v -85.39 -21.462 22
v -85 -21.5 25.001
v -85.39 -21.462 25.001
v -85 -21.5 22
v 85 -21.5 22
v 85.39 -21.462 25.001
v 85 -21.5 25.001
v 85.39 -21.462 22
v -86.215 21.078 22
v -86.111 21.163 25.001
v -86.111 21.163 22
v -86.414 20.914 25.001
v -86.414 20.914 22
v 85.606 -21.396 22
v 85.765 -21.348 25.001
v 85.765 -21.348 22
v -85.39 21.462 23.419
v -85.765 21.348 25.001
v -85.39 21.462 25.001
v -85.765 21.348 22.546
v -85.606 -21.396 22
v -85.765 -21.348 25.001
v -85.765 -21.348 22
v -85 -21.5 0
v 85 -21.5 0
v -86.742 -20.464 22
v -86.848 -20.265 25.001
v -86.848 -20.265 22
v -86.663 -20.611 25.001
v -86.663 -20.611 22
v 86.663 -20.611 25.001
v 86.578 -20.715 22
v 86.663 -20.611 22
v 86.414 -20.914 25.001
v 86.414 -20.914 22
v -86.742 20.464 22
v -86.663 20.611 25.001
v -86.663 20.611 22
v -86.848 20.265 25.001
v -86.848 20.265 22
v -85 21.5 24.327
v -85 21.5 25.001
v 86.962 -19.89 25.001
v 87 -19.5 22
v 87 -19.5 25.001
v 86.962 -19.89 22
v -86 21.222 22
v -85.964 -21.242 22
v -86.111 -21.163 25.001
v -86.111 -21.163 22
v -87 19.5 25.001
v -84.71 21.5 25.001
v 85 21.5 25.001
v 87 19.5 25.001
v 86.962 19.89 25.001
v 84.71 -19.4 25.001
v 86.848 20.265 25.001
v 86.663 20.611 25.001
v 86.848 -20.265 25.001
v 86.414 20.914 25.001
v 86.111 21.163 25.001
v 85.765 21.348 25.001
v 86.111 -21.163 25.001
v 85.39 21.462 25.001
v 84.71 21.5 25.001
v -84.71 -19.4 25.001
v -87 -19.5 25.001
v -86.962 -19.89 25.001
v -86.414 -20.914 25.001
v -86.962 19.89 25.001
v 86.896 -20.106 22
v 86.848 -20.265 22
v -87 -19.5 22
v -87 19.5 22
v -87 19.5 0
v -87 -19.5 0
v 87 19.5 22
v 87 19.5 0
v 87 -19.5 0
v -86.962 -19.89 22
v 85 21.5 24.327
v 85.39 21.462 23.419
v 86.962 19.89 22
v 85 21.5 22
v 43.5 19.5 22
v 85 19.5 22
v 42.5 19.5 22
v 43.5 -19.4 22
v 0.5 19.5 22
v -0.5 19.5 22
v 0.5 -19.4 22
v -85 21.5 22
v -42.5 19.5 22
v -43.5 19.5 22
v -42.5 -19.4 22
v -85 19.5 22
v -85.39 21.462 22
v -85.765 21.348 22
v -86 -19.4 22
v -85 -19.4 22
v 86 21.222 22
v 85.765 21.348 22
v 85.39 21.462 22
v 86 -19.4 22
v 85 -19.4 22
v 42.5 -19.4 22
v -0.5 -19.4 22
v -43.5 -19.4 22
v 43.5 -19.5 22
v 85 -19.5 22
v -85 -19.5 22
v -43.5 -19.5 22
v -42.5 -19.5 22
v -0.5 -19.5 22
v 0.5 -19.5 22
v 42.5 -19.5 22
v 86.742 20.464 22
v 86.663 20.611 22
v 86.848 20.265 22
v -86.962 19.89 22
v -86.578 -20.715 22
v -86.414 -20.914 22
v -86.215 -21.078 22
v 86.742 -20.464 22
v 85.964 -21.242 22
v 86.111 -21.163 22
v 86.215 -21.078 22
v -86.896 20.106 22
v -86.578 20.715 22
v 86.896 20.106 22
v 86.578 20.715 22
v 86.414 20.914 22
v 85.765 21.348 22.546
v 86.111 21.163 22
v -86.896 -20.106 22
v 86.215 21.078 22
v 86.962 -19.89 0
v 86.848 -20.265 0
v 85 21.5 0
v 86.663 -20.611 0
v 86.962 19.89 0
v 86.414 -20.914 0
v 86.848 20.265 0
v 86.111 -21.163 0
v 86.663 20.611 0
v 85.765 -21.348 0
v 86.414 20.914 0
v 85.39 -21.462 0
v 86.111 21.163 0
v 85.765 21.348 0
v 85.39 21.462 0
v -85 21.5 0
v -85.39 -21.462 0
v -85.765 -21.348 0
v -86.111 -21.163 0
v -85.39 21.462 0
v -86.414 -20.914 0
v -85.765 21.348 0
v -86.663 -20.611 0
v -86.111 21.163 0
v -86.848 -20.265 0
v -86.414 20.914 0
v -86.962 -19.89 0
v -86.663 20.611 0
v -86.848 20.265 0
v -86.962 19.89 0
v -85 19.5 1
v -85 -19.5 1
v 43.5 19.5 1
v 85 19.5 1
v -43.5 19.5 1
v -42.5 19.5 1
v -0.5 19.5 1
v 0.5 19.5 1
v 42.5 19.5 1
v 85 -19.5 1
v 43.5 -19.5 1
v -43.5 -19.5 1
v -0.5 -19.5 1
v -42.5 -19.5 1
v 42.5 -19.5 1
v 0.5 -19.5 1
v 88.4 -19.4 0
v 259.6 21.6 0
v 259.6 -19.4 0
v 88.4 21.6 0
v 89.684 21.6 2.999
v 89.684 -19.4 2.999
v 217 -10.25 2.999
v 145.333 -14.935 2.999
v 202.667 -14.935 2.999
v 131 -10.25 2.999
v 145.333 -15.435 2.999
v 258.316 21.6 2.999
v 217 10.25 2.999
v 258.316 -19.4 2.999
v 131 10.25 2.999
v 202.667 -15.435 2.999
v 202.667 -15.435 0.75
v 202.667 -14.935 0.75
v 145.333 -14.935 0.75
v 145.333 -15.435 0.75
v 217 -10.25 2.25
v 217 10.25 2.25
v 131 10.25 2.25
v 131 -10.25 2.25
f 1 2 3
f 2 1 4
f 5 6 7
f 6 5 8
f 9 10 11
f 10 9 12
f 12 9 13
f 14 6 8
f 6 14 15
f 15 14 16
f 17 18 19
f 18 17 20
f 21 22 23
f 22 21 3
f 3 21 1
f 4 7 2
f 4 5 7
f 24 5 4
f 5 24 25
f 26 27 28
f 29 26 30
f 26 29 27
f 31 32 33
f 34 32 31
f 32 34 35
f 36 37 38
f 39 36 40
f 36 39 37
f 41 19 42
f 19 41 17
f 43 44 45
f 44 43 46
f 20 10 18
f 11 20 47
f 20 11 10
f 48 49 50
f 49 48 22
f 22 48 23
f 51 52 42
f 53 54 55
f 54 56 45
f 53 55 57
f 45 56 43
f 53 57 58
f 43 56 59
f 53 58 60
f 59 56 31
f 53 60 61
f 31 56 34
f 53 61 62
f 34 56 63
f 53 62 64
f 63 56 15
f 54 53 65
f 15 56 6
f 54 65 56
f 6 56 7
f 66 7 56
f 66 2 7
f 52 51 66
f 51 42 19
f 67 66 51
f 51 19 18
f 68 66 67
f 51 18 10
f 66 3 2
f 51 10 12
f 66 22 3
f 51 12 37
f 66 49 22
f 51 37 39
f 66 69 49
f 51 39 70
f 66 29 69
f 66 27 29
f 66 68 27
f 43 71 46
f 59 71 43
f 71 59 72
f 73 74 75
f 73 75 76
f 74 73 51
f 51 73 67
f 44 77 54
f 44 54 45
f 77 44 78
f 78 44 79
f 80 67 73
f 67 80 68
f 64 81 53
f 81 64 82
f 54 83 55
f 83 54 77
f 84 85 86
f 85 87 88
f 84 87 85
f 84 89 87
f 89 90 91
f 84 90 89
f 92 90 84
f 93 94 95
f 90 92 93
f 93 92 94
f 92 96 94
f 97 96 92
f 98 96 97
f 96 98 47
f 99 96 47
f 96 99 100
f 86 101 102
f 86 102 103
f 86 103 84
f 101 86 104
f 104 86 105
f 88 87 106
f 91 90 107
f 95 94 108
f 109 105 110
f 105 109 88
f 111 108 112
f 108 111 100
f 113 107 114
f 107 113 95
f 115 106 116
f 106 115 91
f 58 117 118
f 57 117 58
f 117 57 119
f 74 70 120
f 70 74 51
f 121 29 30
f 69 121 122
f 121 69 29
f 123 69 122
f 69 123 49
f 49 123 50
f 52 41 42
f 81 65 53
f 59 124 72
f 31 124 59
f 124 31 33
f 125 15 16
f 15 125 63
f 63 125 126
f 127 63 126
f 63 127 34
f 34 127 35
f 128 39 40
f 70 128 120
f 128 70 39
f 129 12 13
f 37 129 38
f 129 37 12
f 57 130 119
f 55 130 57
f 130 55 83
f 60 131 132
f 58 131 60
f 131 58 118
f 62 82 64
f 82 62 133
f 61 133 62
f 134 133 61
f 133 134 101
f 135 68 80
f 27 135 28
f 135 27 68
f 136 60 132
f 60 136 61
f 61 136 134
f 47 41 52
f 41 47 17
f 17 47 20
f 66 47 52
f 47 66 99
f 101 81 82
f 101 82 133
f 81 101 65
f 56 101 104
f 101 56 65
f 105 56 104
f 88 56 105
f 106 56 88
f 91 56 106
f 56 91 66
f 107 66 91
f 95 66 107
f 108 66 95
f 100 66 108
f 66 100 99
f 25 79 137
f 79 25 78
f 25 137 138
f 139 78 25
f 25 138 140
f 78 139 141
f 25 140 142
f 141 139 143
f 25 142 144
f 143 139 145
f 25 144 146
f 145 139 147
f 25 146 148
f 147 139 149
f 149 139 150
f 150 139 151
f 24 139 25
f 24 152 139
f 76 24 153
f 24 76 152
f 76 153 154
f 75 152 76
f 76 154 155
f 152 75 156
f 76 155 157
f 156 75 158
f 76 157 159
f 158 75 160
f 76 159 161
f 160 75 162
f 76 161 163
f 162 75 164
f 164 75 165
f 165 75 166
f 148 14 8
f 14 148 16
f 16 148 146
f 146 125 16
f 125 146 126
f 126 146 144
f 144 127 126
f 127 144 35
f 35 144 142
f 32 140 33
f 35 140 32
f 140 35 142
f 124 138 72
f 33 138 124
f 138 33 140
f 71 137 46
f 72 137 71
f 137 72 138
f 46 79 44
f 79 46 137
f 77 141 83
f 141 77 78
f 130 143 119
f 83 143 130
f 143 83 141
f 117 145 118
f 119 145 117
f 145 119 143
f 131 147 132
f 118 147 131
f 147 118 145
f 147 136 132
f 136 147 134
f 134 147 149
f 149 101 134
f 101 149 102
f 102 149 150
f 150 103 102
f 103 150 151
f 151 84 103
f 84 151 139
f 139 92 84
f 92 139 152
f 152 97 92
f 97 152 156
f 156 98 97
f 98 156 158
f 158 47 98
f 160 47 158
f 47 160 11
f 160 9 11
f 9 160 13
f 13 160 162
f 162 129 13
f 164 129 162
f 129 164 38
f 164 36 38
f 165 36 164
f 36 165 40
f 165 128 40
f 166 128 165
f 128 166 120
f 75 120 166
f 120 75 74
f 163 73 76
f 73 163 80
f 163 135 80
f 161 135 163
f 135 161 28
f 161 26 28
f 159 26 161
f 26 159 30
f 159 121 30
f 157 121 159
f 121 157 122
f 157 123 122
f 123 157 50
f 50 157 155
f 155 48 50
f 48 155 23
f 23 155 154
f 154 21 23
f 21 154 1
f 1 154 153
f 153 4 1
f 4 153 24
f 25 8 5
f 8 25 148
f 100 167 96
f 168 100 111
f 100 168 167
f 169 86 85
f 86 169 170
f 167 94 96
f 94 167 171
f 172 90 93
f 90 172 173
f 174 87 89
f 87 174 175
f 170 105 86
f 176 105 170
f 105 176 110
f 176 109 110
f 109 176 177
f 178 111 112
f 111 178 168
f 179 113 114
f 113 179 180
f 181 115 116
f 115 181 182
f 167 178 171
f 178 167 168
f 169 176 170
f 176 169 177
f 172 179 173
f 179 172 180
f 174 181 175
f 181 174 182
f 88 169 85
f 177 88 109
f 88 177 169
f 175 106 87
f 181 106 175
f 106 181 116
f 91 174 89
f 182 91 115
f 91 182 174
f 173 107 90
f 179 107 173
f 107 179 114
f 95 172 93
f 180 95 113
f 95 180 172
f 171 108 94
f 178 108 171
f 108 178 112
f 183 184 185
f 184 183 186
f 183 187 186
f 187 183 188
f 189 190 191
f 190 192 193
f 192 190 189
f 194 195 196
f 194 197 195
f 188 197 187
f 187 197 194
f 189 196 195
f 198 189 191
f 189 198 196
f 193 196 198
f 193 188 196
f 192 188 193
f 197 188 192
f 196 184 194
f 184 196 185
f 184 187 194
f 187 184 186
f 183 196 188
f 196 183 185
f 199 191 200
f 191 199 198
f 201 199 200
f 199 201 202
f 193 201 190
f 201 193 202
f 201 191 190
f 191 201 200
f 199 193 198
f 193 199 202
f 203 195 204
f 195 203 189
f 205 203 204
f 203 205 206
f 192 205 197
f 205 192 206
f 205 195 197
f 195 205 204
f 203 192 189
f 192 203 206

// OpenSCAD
// Box builder with angled sliding lid.
// Has potential recess for label and fingernail grip to open.


// preview[view:north west, tilt:top diagonal]

// Width of Box
Box_x = 172;
// Length of Box
Box_y = 41;
// Height of Box
Box_z = 25; 
Wall_thickness = 2;  //[2:0.5:10]
Floor_thickness = 1;
Lid_thickness = 3;   //[2:0.5:10]
// Add inset for a Label
Lid_inset = "yes"; // [yes,no]
// Fingernail recess to ease opening lid
Grip_recess = "yes"; // [yes,no]

// Amount of play in the lid to fit well.
Looseness = 0.8;  //[0:0.1:1]
//
Show_assembled = "no"; // [yes,no]
// Number of internal dividers
X_Dividers = 3;
// Number of internal dividers
Y_Dividers = 0;

/* [Hidden] */
//Lid scale (effective overhang)
lid_scale = 0.985;
fingernail_width = 0.5;

Delta = 0.1;     // to get good overlaps for real objects
roundness = 32;  // for curve res.
epsilon = 0.001; // for minkowski lid height :(

// Lid
module lid(extra_x=Looseness, extra_z=Delta*2) {
	translate([0,Wall_thickness/2+Delta,-Lid_thickness/2-epsilon/2])
	linear_extrude(height=Lid_thickness+extra_z*2, scale=[lid_scale,1])
		square(size=[Box_x+extra_x,Box_y], center=true);
}

// undercut ridge on top of box to hold lid
module lid_ridge(x,y) {
	difference() {
		// the surround
		minkowski(){
			cube(size=[x,y,Lid_thickness], center=true);
			cylinder(h=epsilon, r=Wall_thickness, $fn=roundness); // increases lid height by 2*epsilon
		}
		// minus the lid
		lid(0, epsilon);
	}
}

// helper hole to open lid.
module fingernail_helper() {
	#cube(size=[Box_x/3, fingernail_width,Lid_thickness], center=true);
}


// box
module box() {
	x = Box_x-Wall_thickness;
	y = Box_y-Wall_thickness;
	linear_extrude(height=Box_z-Lid_thickness, convexity=4)
	difference() {
		offset(r=Wall_thickness, $fn=roundness) 
			square(size=[x, y], center=true);
		square(size=[x, y], center=true);
	}
	// floor
	translate([0,0,Floor_thickness/2])
		cube(size=[x+Delta, y+Delta,Floor_thickness],center=true);
	// Top ridge of lid
	translate([0,0,Box_z-Lid_thickness/2])
		lid_ridge(x,y);
}


//-------------------
// Build the box
box();
if (X_Dividers > 0) {
	div_step = Box_x / (X_Dividers+1);
	for (i=[1:X_Dividers]) {
		translate([Box_x/2-div_step*i, -Wall_thickness/4, Box_z/2-Lid_thickness/2])
			cube(size=[Floor_thickness, Box_y, Box_z-Lid_thickness], center=true);
	}
}
if (Y_Dividers > 0) {
	div_step = Box_y / (Y_Dividers+1);
	for (i=[1:Y_Dividers]) {
		#translate([-Wall_thickness/4, Box_y/2-div_step*i, Box_z/2-Lid_thickness/2])
			cube(size=[Box_x, Floor_thickness, Box_z-Lid_thickness], center=true);
	}
}
// Build the Lid
tz = (Show_assembled == "yes") ? Box_z-Lid_thickness/2 : Lid_thickness/2;
tx = (Show_assembled == "no") ? Box_x+Wall_thickness  : 0;
ty = (Show_assembled == "yes") ? Box_y/3  : 0;
lid_color = (Show_assembled == "yes") ? [0.7,0.7,0] : 0;
color(lid_color)
translate([tx,ty,tz])
	difference() {
		lid(-Looseness,0);
		// subtract fingernail recess
		if (Grip_recess=="yes") {
			translate([0,-Box_y/2.7,Lid_thickness/4])
				fingernail_helper();
		}
		// subtract inset
		if (Lid_inset=="yes") {
			translate([0,0,Lid_thickness/2])
				cube(size=[Box_x/2, Box_y/2,Lid_thickness/2], center=true);
		}
	}
